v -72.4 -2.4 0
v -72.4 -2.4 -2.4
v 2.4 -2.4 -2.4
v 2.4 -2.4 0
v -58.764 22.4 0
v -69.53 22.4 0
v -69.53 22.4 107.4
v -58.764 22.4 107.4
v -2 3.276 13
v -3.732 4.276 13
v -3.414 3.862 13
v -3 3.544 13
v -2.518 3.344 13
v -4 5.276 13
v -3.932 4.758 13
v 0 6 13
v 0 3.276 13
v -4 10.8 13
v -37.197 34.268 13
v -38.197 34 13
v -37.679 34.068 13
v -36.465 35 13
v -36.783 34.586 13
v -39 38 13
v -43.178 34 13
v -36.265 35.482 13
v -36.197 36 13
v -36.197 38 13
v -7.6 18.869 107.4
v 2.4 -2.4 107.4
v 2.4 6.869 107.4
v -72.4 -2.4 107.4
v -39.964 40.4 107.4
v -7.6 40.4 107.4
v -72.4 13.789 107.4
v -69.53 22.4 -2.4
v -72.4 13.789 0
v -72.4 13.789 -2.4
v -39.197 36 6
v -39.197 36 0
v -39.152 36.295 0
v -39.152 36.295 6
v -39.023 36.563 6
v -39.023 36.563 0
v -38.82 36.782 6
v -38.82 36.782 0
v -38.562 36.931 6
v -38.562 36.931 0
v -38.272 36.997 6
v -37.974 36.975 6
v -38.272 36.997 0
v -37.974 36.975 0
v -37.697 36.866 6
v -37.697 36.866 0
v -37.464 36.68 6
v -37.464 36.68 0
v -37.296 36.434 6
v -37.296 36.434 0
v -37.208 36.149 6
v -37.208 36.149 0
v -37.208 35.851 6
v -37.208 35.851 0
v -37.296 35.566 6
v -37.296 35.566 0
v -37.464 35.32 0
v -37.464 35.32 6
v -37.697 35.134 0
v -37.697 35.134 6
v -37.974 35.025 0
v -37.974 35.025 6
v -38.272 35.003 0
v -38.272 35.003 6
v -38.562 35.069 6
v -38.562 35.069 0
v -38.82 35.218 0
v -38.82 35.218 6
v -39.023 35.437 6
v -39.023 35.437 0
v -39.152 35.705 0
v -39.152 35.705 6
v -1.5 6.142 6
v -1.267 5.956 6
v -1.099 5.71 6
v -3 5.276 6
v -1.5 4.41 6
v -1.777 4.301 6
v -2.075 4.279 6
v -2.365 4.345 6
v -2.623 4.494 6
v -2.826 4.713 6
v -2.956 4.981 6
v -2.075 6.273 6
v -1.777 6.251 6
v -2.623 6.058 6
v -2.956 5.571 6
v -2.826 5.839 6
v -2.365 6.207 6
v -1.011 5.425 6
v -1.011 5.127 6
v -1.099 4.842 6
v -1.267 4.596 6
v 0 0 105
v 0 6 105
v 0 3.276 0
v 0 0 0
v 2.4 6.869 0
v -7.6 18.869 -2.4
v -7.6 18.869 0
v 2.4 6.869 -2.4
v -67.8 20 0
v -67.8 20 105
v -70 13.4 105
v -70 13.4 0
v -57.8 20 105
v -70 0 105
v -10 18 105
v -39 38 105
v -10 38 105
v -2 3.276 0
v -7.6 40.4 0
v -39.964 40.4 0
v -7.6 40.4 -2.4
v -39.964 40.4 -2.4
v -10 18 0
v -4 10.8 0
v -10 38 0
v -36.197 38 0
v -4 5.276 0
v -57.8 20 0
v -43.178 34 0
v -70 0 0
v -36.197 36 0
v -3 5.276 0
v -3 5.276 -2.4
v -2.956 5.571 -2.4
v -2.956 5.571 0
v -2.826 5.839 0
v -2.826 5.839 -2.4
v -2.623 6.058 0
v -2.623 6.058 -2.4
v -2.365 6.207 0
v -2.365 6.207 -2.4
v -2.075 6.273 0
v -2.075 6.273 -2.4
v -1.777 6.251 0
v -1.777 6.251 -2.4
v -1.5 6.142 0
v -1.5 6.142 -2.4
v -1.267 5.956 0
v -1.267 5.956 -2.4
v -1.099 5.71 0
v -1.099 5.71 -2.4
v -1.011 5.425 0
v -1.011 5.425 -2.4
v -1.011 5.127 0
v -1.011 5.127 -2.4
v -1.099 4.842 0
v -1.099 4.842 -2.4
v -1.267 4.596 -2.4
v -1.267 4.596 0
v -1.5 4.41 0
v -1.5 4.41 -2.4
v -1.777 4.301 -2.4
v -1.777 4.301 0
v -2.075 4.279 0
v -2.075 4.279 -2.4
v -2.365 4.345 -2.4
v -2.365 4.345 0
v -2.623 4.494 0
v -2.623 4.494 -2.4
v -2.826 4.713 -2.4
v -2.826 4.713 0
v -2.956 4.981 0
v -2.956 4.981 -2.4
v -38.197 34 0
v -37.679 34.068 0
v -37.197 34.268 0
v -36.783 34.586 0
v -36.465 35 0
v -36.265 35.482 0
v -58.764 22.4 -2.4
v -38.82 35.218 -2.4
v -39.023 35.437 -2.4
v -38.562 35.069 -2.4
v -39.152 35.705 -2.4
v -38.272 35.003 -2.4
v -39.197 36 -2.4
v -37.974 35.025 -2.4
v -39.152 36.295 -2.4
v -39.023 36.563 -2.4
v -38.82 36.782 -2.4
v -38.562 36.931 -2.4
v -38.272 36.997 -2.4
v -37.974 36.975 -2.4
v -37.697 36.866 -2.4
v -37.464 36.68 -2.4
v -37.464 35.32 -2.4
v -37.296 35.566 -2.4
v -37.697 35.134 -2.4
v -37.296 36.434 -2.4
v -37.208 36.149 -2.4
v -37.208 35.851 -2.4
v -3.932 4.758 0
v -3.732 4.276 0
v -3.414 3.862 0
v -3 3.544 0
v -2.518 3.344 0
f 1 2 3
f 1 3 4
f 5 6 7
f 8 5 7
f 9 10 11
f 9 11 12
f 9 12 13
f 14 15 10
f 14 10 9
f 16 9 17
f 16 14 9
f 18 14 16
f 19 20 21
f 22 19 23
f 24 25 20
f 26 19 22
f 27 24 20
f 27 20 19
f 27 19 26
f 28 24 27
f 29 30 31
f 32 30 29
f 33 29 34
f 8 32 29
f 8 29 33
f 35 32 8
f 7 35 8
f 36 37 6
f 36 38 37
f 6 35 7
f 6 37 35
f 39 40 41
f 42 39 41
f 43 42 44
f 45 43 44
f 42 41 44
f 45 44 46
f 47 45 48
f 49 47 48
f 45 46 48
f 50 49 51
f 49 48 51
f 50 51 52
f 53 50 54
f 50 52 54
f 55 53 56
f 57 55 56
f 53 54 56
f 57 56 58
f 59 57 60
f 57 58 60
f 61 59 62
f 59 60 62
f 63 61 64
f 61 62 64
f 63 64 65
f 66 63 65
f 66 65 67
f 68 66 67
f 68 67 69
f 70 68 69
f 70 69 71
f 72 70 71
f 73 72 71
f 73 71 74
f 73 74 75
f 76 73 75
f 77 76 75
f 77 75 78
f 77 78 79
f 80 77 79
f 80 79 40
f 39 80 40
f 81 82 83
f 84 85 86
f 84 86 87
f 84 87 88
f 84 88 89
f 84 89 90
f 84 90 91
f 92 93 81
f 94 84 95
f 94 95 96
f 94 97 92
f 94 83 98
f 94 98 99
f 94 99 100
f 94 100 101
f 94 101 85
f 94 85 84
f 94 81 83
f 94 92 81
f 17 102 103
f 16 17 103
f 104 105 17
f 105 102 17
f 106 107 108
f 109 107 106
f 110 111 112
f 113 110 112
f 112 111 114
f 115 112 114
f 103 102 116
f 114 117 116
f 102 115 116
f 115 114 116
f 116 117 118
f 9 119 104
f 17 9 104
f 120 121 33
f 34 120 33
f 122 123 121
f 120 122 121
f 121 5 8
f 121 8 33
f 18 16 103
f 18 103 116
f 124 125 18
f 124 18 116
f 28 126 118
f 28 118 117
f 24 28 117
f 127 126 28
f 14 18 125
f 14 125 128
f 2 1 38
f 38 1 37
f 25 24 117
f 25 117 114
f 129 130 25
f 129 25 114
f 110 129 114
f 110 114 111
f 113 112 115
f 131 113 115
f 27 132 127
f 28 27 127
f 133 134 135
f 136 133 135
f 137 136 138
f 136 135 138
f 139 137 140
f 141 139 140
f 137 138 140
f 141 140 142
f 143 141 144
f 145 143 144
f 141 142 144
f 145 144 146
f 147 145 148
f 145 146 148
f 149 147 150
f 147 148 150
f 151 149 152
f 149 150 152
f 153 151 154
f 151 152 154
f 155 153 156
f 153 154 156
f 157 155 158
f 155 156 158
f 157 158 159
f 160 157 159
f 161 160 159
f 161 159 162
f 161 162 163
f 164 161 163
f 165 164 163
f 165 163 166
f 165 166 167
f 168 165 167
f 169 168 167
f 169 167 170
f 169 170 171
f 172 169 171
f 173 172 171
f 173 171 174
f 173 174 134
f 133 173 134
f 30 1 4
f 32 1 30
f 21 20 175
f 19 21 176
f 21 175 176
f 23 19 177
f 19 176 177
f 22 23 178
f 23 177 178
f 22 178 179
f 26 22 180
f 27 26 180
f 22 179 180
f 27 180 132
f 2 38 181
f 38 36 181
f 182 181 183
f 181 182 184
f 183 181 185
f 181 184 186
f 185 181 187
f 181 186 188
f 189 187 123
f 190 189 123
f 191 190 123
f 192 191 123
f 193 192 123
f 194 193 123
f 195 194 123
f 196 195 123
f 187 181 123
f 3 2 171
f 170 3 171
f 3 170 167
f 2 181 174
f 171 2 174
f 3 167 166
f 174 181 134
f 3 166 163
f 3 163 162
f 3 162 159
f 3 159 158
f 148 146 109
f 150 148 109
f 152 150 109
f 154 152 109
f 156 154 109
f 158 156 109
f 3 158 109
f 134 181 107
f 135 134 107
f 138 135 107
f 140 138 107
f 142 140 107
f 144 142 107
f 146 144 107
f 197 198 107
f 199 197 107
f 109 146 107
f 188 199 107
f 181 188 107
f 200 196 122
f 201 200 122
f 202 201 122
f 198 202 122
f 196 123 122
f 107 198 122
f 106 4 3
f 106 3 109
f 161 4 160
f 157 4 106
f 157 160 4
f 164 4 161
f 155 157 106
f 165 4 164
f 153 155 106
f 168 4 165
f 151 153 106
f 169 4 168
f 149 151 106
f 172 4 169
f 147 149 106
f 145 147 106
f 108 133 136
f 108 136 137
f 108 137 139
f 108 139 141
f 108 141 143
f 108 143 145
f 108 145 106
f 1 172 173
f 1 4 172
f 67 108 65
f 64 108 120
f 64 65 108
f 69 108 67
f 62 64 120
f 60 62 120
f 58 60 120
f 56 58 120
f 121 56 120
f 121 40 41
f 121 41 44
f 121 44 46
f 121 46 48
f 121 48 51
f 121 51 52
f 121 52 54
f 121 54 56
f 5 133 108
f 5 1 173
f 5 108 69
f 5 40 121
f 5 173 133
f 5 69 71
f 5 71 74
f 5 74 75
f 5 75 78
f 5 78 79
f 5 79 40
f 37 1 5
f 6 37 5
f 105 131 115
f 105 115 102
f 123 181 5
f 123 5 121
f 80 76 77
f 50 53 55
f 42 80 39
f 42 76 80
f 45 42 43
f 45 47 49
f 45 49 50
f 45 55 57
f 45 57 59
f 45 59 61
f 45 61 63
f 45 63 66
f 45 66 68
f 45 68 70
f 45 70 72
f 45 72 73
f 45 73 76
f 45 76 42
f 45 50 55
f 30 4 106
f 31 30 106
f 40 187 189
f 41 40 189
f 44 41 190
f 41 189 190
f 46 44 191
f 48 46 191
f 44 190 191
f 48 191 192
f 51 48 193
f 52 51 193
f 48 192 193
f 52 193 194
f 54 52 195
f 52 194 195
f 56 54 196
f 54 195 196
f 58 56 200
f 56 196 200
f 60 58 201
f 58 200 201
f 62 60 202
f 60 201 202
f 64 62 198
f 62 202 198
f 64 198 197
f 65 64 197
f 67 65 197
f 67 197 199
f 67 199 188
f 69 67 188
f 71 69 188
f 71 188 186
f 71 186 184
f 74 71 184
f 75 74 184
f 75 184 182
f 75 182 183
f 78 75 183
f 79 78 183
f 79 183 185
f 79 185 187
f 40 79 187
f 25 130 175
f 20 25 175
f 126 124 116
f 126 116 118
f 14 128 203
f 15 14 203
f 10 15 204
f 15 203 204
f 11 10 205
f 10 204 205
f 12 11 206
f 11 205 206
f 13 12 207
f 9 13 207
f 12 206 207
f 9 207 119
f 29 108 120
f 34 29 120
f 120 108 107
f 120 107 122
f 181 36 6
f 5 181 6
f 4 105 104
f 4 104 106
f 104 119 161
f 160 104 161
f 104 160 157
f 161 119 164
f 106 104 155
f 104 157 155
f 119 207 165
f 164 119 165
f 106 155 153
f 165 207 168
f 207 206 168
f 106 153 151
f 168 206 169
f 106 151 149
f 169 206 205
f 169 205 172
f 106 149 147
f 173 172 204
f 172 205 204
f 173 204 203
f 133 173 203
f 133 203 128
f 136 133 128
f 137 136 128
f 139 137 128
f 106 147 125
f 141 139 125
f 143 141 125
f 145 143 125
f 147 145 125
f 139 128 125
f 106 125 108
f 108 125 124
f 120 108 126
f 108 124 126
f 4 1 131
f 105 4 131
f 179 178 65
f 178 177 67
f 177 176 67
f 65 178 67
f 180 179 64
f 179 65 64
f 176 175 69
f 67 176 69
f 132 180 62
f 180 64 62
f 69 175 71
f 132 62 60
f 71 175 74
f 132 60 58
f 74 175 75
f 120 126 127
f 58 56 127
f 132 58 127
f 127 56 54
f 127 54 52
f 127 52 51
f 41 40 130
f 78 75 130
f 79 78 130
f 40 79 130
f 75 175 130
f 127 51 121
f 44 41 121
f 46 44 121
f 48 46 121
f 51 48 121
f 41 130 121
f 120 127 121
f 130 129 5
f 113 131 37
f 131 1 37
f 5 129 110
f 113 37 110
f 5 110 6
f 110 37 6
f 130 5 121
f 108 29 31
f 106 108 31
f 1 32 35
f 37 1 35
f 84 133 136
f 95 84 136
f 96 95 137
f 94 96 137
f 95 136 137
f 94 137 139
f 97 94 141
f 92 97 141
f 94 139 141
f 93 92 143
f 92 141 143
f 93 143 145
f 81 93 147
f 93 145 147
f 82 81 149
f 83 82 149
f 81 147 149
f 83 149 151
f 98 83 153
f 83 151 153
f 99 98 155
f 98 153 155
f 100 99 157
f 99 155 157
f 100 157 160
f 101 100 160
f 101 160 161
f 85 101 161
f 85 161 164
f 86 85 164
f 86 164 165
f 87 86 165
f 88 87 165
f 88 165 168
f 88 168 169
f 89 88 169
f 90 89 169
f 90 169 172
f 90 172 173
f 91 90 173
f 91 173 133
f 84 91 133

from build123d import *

# Parameters (mm, degrees)
BOSS_EXTRUDE1_DEPTH    = 105
SHELL1_START           = -10
SHELL1_OUTLINE_W       = 18
SHELL1_OUTLINE_H       = 109.8
SHELL1_DEPTH           = 2.4
SHELL1_START_2         = -58.763690343
SHELL1_2_OUTLINE_W     = 42.8
SHELL1_2_OUTLINE_H     = 109.8
SHELL1_2_DEPTH         = 51.163690343
SHELL1_START_3         = -72.4
SHELL1_3_OUTLINE_W     = 24.8
SHELL1_3_OUTLINE_H     = 109.8
SHELL1_3_DEPTH         = 74.8
SHELL1_4_DEPTH         = 105
SHELL1_START_4         = -2.4
SHELL1_5_DEPTH         = 109.8
BOSS_EXTRUDE3_DEPTH    = 15.4
SKETCH5_R              = 1
CUT_EXTRUDE1_DEPTH     = 8.4
SPLIT1_SURFACE_1_BACK  = 140.581
SPLIT1_SURFACE_1_DEPTH = 281.162
SPLIT1_SURFACE_2_BACK  = 140.581
SPLIT1_SURFACE_2_DEPTH = 281.162


with BuildPart() as part:
    # Sketch1 → Boss-Extrude1 (new body)
    with BuildSketch(Plane.XY):
        Polygon((-39, 38), (-57.8, 20), (-67.8, 20), (-70, 13.400019651), (-70, 0), (0, 0), (0, 6), (-10, 18), (-10, 38), align=None)
    extrude(amount=BOSS_EXTRUDE1_DEPTH)

    # Shell1: read off the stored shape, not the designer's step
    # Shell1 outline → Shell1 (add)
    with BuildSketch(Plane.YZ.offset(SHELL1_START)):
        with Locations((31.4, 52.5)):
            Rectangle(SHELL1_OUTLINE_W, SHELL1_OUTLINE_H)
    extrude(amount=SHELL1_DEPTH)

    # Shell1 2 outline → Shell1 2 (add)
    with BuildSketch(Plane.YZ.offset(SHELL1_START_2)):
        with Locations((19, 52.5)):
            Rectangle(SHELL1_2_OUTLINE_W, SHELL1_2_OUTLINE_H)
    extrude(amount=SHELL1_2_DEPTH)

    # Shell1 3 outline → Shell1 3 (add)
    with BuildSketch(Plane.YZ.offset(SHELL1_START_3)):
        with Locations((10, 52.5)):
            Rectangle(SHELL1_3_OUTLINE_W, SHELL1_3_OUTLINE_H)
    extrude(amount=SHELL1_3_DEPTH)

    # Shell1 4 outline → Shell1 4 (cut)
    with BuildSketch(Plane.XY):
        Polygon((-7.6, 22.4), (-7.6, 18.868919844), (2.4, 6.868919844), (2.4, 22.4), align=None)
        Polygon((-72.4, 13.789487135), (-69.529820499, 22.4), (-72.4, 22.4), align=None)
        Polygon((-58.763690343, 22.4), (-39.963690343, 40.4), (-58.763690343, 40.4), align=None)
        Polygon((0, 0), (0, 6), (-10, 18), (-10, 38), (-39, 38), (-57.8, 20), (-67.8, 20), (-70, 13.400019651), (-70, 0), align=None)
    extrude(amount=SHELL1_4_DEPTH, mode=Mode.SUBTRACT)

    # Shell1 5 outline → Shell1 5 (cut)
    with BuildSketch(Plane.XY.offset(SHELL1_START_4)):
        Polygon((-7.6, 22.4), (-7.6, 18.868919844), (2.4, 6.868919844), (2.4, 22.4), align=None)
        Polygon((-72.4, 13.789487135), (-69.529820499, 22.4), (-72.4, 22.4), align=None)
        Polygon((-58.763690343, 22.4), (-39.963690343, 40.4), (-58.763690343, 40.4), align=None)
    extrude(amount=SHELL1_5_DEPTH, mode=Mode.SUBTRACT)

    # Sketch4 → Boss-Extrude3 (add)
    with BuildSketch(Plane(origin=(0, 0, -2.4), x_dir=(-1, 0, 0), z_dir=(0, 0, -1))):
        with BuildLine():
            Line((36.196924714, 36), (36.196924714, 38))
            Line((36.196924714, 38), (39, 38))
            Line((39, 38), (43.177777778, 34))
            Line((43.177777778, 34), (38.196924714, 34))
            ThreePointArc((38.196924714, 34), (36.782711151, 34.585786438), (36.196924714, 36))
        make_face()
        with BuildLine():
            Line((2, 3.27590013), (0, 3.27590013))
            Line((0, 3.27590013), (0, 6))
            Line((0, 6), (4, 10.8))
            Line((4, 10.8), (4, 5.27590013))
            ThreePointArc((4, 5.27590013), (3.414213562, 3.861686567), (2, 3.27590013))
        make_face()
    extrude(amount=-BOSS_EXTRUDE3_DEPTH)

    # Sketch5 → Cut-Extrude1 (cut)
    with BuildSketch(Plane(origin=(0, 0, -2.4), x_dir=(-1, 0, 0), z_dir=(0, 0, -1))):
        with Locations((2, 5.27590013)):
            Circle(SKETCH5_R)
        with Locations((38.196924714, 36)):
            Circle(SKETCH5_R)
    extrude(amount=-CUT_EXTRUDE1_DEPTH, mode=Mode.SUBTRACT)


with BuildPart() as body_2:
    # Split1: the piece behind the surface
    add(part.part)
    # Split1 surface: a surface, the sketch's curves swept straight by 281.162 mm
    with BuildLine(Plane(origin=(0, 0, 0), x_dir=(0, 0, -1), z_dir=(1, 0, 0)).offset(-SPLIT1_SURFACE_1_BACK), mode=Mode.PRIVATE) as split1_surface_1_path:
        Line((0, -2.4), (0, 40.4))
    split1_surface_1 = Shell.extrude(split1_surface_1_path.wire(), (1 * SPLIT1_SURFACE_1_DEPTH, 0 * SPLIT1_SURFACE_1_DEPTH, 0 * SPLIT1_SURFACE_1_DEPTH))
    split(bisect_by=split1_surface_1, keep=Keep.BOTTOM)


with BuildPart() as part_1:
    add(part.part)

    # Split1: split by a surface, the side it looks to stays
    # Split1 surface: a surface, the sketch's curves swept straight by 281.162 mm
    with BuildLine(Plane(origin=(0, 0, 0), x_dir=(0, 0, -1), z_dir=(1, 0, 0)).offset(-SPLIT1_SURFACE_2_BACK), mode=Mode.PRIVATE) as split1_surface_2_path:
        Line((0, -2.4), (0, 40.4))
    split1_surface_2 = Shell.extrude(split1_surface_2_path.wire(), (1 * SPLIT1_SURFACE_2_DEPTH, 0 * SPLIT1_SURFACE_2_DEPTH, 0 * SPLIT1_SURFACE_2_DEPTH))
    split(bisect_by=split1_surface_2, keep=Keep.TOP)


solid = Compound([body_2.part, part_1.part])
